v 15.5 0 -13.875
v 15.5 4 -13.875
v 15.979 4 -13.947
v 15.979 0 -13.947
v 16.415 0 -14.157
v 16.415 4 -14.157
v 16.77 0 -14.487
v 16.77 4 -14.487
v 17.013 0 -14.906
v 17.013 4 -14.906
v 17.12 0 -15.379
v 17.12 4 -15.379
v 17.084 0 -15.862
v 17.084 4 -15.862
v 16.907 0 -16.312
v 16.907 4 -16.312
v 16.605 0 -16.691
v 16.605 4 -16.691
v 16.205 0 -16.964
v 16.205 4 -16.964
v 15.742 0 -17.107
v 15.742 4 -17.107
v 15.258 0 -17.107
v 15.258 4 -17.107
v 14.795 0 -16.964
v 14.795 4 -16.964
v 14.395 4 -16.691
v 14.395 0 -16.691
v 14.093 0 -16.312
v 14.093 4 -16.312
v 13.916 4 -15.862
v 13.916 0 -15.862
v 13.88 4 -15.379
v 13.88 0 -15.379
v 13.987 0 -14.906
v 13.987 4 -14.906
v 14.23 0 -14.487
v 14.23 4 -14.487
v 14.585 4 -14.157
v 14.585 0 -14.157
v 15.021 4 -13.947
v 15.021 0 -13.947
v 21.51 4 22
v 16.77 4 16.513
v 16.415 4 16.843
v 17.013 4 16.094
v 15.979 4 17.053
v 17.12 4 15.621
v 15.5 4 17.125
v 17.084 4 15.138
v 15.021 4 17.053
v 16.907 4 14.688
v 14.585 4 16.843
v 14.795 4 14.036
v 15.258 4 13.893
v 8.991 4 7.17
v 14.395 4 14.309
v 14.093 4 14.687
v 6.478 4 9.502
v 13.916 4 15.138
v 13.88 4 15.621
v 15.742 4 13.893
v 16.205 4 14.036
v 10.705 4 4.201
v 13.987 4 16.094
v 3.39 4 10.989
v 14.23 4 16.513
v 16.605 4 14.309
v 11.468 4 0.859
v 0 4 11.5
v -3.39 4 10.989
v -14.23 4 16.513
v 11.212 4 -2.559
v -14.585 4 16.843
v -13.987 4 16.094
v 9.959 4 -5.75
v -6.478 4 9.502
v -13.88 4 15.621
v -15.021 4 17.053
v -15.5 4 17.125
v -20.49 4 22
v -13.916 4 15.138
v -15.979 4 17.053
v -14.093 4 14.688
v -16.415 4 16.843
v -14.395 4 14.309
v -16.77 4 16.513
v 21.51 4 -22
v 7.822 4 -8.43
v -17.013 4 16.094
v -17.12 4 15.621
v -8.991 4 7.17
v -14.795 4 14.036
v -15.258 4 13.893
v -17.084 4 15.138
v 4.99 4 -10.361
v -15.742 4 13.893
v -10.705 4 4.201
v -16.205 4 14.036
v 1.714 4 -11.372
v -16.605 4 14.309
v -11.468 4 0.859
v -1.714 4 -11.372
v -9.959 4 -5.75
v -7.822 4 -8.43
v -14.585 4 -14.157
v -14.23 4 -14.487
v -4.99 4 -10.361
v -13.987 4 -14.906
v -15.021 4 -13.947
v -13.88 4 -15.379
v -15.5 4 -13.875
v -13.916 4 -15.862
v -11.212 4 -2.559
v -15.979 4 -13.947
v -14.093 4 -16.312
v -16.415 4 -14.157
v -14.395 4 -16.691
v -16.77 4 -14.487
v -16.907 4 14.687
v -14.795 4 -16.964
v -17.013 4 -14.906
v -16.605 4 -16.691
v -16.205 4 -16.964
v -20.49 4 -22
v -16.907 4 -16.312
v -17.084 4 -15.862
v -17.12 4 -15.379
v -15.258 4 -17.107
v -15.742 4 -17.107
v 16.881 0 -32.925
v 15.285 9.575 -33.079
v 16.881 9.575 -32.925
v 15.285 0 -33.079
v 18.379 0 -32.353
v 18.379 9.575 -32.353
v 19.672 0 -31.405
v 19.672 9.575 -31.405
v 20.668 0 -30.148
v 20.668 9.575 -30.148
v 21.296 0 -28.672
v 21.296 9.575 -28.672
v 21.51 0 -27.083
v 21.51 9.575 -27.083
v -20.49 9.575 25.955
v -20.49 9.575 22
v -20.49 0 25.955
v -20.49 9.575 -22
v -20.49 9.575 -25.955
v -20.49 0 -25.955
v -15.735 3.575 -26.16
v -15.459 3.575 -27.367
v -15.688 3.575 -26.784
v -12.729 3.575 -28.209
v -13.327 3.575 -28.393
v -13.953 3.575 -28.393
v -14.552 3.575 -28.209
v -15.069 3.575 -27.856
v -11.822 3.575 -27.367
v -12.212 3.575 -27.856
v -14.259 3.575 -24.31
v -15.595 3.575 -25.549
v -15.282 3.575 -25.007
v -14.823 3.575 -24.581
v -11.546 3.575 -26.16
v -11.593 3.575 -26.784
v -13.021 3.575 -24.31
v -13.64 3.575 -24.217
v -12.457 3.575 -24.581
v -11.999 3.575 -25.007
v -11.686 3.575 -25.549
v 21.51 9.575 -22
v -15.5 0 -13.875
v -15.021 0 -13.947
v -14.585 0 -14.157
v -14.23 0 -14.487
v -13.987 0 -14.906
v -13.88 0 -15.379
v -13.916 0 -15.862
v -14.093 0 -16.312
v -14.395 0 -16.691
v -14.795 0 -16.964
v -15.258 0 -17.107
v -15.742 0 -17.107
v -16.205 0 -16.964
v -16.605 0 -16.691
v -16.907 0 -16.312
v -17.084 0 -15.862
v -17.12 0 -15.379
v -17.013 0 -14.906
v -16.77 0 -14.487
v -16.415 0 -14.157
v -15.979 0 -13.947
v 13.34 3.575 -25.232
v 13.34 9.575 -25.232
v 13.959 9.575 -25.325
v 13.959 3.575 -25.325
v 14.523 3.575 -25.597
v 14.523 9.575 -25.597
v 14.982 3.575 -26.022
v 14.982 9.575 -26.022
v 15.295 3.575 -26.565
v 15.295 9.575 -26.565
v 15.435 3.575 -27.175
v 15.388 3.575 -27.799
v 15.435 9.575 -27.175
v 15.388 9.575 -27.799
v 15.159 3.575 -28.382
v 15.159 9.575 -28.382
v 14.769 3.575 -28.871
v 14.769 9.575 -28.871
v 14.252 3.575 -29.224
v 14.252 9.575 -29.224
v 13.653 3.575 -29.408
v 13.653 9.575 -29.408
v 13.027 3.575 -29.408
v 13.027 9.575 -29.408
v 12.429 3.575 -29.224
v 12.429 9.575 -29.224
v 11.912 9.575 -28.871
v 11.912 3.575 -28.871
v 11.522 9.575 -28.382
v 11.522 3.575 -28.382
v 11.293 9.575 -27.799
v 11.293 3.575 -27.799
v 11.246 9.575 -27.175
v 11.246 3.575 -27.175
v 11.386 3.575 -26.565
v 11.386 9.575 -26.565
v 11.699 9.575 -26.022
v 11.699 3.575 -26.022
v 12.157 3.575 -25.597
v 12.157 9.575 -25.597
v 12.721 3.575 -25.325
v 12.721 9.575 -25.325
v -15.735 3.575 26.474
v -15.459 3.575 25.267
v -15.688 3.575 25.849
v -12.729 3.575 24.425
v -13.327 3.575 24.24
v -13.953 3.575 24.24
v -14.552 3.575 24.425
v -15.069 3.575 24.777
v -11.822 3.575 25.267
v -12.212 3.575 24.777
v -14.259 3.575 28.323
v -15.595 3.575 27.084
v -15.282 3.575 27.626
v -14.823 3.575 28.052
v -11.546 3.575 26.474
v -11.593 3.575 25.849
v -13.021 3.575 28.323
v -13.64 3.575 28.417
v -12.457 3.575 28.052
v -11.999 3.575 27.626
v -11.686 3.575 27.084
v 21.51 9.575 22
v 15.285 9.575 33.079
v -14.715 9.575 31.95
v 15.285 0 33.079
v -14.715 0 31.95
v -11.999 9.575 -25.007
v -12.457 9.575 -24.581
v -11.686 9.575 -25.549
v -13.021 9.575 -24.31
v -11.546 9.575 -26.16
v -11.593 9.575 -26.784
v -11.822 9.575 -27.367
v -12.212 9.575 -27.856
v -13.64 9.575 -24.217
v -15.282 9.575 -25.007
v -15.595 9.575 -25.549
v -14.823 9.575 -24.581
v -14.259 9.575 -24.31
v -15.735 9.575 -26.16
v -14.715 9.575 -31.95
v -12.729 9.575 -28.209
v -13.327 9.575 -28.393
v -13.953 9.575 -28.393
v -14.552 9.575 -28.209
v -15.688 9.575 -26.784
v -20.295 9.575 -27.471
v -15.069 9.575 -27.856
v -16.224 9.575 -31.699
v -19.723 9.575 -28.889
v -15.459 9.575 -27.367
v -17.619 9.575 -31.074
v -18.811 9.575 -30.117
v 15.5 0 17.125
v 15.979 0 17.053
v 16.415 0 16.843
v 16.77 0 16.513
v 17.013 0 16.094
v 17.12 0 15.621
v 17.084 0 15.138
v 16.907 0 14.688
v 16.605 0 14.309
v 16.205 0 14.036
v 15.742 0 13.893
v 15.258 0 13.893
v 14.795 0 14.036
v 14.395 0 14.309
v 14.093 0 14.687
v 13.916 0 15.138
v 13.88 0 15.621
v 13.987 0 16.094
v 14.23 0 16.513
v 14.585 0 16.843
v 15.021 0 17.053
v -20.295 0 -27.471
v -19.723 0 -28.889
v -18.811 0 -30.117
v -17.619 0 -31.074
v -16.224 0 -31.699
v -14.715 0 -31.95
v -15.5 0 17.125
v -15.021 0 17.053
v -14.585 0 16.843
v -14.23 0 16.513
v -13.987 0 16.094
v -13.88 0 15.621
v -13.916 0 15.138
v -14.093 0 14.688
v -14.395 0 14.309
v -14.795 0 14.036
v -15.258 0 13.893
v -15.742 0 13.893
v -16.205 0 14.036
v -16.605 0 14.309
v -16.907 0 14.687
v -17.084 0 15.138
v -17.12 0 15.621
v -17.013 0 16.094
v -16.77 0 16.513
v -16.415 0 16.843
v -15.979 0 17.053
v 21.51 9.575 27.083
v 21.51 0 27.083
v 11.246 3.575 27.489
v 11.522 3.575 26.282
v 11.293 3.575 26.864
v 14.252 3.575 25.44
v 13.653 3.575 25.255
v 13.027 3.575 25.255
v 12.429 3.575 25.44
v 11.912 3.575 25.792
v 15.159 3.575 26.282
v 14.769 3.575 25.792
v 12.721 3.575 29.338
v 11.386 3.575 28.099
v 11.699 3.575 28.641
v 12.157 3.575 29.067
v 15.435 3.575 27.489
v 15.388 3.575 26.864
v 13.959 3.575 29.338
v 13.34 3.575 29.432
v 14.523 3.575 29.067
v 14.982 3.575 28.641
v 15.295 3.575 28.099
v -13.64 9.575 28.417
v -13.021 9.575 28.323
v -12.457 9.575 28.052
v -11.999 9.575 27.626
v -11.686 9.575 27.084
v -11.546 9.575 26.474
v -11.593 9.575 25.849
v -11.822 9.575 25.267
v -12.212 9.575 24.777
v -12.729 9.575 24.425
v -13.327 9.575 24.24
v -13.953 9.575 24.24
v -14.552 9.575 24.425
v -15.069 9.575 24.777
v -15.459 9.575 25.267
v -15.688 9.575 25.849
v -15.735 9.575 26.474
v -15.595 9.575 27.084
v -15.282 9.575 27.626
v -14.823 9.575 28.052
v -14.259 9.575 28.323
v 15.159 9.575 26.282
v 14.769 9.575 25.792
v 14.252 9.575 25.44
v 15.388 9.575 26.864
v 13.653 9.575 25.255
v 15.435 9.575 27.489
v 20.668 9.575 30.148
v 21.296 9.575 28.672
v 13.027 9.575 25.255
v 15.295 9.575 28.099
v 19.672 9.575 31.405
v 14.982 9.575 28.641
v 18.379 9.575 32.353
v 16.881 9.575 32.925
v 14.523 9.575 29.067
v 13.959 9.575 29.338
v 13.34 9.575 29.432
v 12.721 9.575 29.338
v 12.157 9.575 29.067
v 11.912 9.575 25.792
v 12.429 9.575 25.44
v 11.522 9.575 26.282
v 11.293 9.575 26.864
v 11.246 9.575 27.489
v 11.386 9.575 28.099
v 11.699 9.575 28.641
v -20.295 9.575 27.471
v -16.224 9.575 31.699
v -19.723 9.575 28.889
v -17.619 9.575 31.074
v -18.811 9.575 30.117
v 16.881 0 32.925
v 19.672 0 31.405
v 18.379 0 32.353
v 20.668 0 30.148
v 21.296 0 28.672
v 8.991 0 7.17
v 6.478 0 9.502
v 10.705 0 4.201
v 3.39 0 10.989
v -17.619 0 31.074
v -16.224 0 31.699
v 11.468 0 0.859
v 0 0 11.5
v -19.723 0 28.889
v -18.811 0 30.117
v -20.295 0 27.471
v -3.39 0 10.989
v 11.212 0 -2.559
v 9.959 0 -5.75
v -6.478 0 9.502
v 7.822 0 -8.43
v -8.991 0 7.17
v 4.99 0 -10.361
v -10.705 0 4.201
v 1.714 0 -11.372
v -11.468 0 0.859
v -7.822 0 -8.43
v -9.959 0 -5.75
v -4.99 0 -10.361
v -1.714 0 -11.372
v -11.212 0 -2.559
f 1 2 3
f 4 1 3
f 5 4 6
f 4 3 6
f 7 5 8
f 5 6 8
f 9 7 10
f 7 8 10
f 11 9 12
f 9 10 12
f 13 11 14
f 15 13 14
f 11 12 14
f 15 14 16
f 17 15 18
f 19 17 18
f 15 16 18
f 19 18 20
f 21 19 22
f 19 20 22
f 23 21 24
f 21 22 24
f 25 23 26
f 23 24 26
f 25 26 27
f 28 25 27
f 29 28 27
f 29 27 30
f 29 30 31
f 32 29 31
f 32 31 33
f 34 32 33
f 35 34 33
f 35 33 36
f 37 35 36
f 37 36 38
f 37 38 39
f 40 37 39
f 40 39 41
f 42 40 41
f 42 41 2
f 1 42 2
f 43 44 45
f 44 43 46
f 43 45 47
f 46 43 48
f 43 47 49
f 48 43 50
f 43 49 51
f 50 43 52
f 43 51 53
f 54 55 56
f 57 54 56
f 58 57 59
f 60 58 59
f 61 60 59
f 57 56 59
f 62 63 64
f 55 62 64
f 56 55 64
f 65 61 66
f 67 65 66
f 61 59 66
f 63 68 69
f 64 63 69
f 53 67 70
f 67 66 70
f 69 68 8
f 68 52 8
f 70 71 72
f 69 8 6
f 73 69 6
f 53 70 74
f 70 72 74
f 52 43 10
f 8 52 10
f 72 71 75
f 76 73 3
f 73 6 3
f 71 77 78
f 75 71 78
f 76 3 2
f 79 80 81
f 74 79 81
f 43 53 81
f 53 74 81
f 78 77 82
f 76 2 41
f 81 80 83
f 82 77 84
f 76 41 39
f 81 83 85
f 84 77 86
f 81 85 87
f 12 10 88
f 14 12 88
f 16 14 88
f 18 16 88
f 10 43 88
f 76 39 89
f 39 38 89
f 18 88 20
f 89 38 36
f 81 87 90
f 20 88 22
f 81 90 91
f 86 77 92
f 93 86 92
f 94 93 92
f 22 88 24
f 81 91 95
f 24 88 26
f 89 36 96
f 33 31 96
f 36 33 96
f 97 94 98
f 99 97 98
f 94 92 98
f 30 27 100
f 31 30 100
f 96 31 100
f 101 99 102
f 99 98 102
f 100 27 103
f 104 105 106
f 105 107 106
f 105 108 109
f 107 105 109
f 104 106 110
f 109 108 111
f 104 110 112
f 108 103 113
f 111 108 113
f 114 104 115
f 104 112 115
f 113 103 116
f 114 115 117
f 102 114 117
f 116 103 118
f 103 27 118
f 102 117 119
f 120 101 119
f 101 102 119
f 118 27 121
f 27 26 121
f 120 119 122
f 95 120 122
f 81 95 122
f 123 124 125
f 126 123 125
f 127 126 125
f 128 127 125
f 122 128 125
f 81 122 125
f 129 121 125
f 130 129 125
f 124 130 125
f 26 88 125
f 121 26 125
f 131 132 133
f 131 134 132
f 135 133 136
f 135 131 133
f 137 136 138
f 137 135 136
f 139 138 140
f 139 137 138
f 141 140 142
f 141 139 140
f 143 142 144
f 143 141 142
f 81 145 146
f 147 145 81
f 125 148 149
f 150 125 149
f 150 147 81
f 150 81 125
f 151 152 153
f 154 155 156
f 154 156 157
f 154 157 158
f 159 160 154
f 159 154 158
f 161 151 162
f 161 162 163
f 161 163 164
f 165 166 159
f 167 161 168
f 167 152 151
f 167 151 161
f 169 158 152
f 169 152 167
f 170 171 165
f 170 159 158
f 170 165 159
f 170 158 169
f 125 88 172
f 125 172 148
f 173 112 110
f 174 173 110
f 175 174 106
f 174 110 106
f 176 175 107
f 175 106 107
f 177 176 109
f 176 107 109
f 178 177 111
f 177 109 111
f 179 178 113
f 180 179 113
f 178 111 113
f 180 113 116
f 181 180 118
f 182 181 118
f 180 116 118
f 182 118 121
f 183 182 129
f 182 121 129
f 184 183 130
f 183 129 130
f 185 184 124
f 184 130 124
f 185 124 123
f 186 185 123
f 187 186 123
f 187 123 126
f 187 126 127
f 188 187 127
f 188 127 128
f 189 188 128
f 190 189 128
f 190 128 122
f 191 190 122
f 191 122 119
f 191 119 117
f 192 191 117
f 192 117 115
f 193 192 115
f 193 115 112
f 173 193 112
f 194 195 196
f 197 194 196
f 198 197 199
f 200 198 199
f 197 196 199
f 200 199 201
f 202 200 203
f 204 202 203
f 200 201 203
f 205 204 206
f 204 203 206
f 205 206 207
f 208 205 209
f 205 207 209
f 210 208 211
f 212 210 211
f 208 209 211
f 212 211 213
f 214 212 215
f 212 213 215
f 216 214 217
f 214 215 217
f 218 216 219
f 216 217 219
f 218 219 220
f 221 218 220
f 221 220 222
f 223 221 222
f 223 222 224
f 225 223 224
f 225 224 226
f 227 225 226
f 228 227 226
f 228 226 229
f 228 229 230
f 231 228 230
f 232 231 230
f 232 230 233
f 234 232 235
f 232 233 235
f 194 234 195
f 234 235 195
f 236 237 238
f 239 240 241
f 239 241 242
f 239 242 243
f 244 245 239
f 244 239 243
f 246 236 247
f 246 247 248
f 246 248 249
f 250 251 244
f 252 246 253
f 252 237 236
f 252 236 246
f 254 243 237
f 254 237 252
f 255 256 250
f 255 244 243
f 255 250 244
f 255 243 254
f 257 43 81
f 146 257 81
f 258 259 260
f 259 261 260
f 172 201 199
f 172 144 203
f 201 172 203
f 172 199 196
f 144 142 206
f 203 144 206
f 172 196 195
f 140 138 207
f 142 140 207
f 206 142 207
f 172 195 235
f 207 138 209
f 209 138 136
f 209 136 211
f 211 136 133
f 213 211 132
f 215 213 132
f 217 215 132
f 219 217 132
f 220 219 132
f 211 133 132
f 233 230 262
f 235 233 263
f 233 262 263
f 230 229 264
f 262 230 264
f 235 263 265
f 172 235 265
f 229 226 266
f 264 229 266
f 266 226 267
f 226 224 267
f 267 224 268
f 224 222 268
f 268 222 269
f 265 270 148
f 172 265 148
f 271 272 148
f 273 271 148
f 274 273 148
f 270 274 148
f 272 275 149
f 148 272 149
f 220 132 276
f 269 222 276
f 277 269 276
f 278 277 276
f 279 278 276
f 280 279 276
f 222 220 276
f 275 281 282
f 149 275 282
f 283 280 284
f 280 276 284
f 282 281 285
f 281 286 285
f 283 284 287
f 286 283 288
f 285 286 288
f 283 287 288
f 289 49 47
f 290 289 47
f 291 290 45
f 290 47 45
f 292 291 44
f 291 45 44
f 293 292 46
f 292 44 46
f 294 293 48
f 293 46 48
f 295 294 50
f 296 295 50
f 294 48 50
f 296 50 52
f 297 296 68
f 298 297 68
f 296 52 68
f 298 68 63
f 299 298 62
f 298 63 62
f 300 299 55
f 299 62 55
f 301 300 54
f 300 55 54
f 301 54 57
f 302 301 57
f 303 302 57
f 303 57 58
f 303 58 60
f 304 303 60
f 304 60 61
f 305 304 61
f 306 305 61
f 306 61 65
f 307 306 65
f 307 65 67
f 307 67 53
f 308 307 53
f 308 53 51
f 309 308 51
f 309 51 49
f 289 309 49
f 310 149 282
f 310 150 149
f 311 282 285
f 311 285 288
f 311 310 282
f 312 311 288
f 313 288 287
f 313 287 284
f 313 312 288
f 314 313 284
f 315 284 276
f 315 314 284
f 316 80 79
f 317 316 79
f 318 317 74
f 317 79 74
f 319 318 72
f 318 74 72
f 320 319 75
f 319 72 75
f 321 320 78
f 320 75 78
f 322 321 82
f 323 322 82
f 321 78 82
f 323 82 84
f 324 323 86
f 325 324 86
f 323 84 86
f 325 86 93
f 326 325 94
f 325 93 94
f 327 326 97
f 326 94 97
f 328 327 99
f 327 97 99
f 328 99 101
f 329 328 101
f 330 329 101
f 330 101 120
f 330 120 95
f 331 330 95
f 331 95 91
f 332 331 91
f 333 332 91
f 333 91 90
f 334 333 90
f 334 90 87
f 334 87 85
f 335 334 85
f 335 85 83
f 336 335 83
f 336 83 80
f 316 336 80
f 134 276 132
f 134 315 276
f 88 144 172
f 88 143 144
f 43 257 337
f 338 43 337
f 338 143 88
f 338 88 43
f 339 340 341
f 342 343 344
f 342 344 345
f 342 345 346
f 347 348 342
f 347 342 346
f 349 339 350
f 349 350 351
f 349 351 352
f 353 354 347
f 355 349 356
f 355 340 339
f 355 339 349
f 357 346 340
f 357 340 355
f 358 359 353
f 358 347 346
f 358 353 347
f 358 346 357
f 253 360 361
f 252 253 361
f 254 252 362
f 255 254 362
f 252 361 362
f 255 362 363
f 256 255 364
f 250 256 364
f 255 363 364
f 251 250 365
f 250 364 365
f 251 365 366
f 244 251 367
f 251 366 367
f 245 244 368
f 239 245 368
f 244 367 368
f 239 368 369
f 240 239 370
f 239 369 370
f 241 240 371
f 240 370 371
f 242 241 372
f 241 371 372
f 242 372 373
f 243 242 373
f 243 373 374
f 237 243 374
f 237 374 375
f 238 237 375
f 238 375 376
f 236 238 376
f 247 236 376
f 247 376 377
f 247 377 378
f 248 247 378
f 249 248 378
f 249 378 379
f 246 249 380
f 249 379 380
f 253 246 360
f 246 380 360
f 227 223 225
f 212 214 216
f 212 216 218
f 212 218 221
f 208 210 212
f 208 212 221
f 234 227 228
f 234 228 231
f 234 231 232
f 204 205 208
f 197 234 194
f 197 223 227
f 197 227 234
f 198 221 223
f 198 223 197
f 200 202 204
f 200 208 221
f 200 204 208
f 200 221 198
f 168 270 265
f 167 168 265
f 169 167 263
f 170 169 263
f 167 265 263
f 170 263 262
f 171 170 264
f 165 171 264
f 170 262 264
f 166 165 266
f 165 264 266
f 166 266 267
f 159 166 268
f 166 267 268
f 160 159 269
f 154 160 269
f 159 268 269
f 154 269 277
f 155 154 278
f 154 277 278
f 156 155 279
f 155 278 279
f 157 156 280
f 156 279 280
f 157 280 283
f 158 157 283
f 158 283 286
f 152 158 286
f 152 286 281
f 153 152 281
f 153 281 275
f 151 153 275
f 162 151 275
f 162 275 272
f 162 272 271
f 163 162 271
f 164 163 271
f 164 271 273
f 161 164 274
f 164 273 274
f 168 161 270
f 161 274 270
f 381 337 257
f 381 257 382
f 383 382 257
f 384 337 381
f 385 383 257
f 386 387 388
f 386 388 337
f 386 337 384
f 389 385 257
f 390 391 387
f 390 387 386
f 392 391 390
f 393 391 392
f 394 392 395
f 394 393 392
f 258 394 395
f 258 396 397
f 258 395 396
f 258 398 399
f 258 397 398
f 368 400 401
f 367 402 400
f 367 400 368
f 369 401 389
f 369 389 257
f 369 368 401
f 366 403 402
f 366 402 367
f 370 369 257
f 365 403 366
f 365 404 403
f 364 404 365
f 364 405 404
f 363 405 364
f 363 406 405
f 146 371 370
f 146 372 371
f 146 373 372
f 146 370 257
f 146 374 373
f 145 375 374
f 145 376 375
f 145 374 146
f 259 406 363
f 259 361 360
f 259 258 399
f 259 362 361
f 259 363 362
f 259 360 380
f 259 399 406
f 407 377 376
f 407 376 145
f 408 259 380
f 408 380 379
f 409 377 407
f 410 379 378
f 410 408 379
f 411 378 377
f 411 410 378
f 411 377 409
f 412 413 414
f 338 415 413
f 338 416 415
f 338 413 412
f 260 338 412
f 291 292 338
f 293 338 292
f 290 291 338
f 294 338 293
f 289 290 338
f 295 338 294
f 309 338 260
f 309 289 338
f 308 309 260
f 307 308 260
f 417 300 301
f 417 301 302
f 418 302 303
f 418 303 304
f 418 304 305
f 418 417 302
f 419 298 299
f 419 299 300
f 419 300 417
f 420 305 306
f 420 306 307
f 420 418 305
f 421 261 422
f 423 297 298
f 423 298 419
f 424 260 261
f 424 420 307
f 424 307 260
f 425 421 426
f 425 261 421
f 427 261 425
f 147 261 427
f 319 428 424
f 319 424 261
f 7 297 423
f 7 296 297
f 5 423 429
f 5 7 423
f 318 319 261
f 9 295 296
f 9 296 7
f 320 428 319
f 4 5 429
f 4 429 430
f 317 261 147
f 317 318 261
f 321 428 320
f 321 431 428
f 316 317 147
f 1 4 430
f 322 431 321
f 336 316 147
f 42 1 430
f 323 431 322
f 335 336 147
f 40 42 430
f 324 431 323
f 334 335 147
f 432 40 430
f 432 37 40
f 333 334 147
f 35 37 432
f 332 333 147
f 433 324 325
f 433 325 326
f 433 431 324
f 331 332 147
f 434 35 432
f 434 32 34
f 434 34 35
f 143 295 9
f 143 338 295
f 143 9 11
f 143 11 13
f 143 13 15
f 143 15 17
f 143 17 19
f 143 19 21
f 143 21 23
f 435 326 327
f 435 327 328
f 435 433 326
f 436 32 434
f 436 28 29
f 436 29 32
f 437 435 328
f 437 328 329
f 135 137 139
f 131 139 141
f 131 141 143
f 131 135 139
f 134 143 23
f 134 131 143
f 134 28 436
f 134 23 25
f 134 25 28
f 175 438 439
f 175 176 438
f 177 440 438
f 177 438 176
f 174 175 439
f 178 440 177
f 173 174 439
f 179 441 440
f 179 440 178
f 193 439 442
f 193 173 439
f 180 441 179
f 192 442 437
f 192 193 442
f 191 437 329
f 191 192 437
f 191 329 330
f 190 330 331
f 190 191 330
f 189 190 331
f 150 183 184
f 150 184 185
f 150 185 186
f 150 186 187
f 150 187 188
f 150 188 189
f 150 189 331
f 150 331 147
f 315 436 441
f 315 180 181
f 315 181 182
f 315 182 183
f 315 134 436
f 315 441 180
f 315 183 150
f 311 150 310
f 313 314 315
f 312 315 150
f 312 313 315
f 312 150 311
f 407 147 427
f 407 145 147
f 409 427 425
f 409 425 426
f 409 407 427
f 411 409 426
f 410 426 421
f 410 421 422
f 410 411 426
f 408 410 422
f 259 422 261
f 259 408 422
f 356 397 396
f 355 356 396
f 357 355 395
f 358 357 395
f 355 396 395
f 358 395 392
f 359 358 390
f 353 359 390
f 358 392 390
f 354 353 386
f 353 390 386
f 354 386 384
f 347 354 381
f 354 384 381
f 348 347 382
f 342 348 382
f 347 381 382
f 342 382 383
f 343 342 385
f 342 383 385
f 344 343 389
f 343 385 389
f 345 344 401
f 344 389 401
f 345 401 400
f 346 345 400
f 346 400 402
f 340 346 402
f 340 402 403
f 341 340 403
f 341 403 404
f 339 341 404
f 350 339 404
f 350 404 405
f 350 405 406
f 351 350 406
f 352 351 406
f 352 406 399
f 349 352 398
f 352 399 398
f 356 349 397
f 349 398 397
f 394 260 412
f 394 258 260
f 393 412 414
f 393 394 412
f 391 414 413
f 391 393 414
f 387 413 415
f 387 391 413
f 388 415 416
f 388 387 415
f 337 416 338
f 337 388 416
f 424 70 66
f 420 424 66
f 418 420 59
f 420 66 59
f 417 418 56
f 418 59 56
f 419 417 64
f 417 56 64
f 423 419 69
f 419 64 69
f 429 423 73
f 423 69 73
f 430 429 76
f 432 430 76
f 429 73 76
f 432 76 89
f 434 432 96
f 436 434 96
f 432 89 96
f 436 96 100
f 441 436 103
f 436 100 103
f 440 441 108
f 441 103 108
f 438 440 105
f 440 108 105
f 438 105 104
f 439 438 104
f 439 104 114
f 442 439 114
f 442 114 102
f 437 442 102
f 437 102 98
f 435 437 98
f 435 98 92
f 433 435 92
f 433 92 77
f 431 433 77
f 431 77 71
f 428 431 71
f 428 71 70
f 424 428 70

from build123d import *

# Parameters (mm, degrees)
BOSS_EXTRUDE1_DEPTH = 4
SKETCH3_R           = 11.5
CUT_EXTRUDE1_DEPTH  = 40.855495589
SKETCH4_R           = 1.625
CUT_EXTRUDE2_DEPTH  = 40.855495589
BOSS_EXTRUDE2_DEPTH = 5.575
SKETCH7_R           = 2.1
CUT_EXTRUDE3_DEPTH  = 6
FILLET1_R           = 6


with BuildPart() as part:
    # Sketch1 → Boss-Extrude1 (new body)
    with BuildSketch(Plane(origin=(0, 0, 0), x_dir=(1, 0, 0), z_dir=(0, 1, 0))):
        Polygon((21.510162675, -33.313262079), (-20.489837325, -31.733061767), (-20.489837325, 31.733061767), (21.510162675, 33.313262079), align=None)
    extrude(amount=BOSS_EXTRUDE1_DEPTH)

    # Sketch3 → Cut-Extrude1 (cut, through all)
    with BuildSketch(Plane(origin=(0, 4, 0), x_dir=(1, 0, 0), z_dir=(0, 1, 0))):
        with Locations(Location((0, 0, 0), (0, 0, 270))):
            Circle(SKETCH3_R)
    extrude(amount=-CUT_EXTRUDE1_DEPTH, mode=Mode.SUBTRACT)

    # Sketch4 → Cut-Extrude2 (cut, through all)
    with BuildSketch(Plane(origin=(0, 4, 0), x_dir=(1, 0, 0), z_dir=(0, 1, 0))):
        with Locations(Location((-15.5, 15.5, 0), (0, 0, 270))):
            Circle(SKETCH4_R)
        with Locations(Location((15.5, 15.5, 0), (0, 0, 270))):
            Circle(SKETCH4_R)
        with Locations(Location((15.5, -15.5, 0), (0, 0, 270))):
            Circle(SKETCH4_R)
        with Locations(Location((-15.5, -15.5, 0), (0, 0, 270))):
            Circle(SKETCH4_R)
    extrude(amount=-CUT_EXTRUDE2_DEPTH, mode=Mode.SUBTRACT)

    # Sketch6 → Boss-Extrude2 (add)
    with BuildSketch(Plane.XZ.offset(-4)):
        Polygon((-20.489837325, 22), (-20.489837325, 31.733061767), (21.510162675, 33.313262079), (21.510162675, 22), align=None)
    boss_extrude2 = extrude(amount=-BOSS_EXTRUDE2_DEPTH)

    # Mirror1: Boss-Extrude2 across plane
    add(boss_extrude2.mirror(Plane.XY))

    # Sketch7 → Cut-Extrude3 (cut)
    with BuildSketch(Plane(origin=(0, 9.575, 0), x_dir=(1, 0, 0), z_dir=(0, 1, 0))):
        with Locations(Location((13.340455159, 27.331724457, 0), (0, 0, 270))):
            Circle(SKETCH7_R)
        with Locations(Location((-13.640455159, 26.316599626, 0), (0, 0, 270))):
            Circle(SKETCH7_R)
        with Locations(Location((-13.640455159, -26.316599626, 0), (0, 0, 270))):
            Circle(SKETCH7_R)
        with Locations(Location((13.340455159, -27.331724457, 0), (0, 0, 270))):
            Circle(SKETCH7_R)
    extrude(amount=-CUT_EXTRUDE3_DEPTH, mode=Mode.SUBTRACT)

    # Fillet1
    fillet1_edges = [part.edges().sort_by_distance(p)[0] for p in [
        (-20.489837325, 4.7875, -31.733061767),
        (21.510162675, 4.7875, -33.313262079),
        (21.510162675, 4.7875, 33.313262079),
        (-20.489837325, 4.7875, 31.733061767),
    ]]
    fillet(fillet1_edges, radius=FILLET1_R)


solid = part.part
